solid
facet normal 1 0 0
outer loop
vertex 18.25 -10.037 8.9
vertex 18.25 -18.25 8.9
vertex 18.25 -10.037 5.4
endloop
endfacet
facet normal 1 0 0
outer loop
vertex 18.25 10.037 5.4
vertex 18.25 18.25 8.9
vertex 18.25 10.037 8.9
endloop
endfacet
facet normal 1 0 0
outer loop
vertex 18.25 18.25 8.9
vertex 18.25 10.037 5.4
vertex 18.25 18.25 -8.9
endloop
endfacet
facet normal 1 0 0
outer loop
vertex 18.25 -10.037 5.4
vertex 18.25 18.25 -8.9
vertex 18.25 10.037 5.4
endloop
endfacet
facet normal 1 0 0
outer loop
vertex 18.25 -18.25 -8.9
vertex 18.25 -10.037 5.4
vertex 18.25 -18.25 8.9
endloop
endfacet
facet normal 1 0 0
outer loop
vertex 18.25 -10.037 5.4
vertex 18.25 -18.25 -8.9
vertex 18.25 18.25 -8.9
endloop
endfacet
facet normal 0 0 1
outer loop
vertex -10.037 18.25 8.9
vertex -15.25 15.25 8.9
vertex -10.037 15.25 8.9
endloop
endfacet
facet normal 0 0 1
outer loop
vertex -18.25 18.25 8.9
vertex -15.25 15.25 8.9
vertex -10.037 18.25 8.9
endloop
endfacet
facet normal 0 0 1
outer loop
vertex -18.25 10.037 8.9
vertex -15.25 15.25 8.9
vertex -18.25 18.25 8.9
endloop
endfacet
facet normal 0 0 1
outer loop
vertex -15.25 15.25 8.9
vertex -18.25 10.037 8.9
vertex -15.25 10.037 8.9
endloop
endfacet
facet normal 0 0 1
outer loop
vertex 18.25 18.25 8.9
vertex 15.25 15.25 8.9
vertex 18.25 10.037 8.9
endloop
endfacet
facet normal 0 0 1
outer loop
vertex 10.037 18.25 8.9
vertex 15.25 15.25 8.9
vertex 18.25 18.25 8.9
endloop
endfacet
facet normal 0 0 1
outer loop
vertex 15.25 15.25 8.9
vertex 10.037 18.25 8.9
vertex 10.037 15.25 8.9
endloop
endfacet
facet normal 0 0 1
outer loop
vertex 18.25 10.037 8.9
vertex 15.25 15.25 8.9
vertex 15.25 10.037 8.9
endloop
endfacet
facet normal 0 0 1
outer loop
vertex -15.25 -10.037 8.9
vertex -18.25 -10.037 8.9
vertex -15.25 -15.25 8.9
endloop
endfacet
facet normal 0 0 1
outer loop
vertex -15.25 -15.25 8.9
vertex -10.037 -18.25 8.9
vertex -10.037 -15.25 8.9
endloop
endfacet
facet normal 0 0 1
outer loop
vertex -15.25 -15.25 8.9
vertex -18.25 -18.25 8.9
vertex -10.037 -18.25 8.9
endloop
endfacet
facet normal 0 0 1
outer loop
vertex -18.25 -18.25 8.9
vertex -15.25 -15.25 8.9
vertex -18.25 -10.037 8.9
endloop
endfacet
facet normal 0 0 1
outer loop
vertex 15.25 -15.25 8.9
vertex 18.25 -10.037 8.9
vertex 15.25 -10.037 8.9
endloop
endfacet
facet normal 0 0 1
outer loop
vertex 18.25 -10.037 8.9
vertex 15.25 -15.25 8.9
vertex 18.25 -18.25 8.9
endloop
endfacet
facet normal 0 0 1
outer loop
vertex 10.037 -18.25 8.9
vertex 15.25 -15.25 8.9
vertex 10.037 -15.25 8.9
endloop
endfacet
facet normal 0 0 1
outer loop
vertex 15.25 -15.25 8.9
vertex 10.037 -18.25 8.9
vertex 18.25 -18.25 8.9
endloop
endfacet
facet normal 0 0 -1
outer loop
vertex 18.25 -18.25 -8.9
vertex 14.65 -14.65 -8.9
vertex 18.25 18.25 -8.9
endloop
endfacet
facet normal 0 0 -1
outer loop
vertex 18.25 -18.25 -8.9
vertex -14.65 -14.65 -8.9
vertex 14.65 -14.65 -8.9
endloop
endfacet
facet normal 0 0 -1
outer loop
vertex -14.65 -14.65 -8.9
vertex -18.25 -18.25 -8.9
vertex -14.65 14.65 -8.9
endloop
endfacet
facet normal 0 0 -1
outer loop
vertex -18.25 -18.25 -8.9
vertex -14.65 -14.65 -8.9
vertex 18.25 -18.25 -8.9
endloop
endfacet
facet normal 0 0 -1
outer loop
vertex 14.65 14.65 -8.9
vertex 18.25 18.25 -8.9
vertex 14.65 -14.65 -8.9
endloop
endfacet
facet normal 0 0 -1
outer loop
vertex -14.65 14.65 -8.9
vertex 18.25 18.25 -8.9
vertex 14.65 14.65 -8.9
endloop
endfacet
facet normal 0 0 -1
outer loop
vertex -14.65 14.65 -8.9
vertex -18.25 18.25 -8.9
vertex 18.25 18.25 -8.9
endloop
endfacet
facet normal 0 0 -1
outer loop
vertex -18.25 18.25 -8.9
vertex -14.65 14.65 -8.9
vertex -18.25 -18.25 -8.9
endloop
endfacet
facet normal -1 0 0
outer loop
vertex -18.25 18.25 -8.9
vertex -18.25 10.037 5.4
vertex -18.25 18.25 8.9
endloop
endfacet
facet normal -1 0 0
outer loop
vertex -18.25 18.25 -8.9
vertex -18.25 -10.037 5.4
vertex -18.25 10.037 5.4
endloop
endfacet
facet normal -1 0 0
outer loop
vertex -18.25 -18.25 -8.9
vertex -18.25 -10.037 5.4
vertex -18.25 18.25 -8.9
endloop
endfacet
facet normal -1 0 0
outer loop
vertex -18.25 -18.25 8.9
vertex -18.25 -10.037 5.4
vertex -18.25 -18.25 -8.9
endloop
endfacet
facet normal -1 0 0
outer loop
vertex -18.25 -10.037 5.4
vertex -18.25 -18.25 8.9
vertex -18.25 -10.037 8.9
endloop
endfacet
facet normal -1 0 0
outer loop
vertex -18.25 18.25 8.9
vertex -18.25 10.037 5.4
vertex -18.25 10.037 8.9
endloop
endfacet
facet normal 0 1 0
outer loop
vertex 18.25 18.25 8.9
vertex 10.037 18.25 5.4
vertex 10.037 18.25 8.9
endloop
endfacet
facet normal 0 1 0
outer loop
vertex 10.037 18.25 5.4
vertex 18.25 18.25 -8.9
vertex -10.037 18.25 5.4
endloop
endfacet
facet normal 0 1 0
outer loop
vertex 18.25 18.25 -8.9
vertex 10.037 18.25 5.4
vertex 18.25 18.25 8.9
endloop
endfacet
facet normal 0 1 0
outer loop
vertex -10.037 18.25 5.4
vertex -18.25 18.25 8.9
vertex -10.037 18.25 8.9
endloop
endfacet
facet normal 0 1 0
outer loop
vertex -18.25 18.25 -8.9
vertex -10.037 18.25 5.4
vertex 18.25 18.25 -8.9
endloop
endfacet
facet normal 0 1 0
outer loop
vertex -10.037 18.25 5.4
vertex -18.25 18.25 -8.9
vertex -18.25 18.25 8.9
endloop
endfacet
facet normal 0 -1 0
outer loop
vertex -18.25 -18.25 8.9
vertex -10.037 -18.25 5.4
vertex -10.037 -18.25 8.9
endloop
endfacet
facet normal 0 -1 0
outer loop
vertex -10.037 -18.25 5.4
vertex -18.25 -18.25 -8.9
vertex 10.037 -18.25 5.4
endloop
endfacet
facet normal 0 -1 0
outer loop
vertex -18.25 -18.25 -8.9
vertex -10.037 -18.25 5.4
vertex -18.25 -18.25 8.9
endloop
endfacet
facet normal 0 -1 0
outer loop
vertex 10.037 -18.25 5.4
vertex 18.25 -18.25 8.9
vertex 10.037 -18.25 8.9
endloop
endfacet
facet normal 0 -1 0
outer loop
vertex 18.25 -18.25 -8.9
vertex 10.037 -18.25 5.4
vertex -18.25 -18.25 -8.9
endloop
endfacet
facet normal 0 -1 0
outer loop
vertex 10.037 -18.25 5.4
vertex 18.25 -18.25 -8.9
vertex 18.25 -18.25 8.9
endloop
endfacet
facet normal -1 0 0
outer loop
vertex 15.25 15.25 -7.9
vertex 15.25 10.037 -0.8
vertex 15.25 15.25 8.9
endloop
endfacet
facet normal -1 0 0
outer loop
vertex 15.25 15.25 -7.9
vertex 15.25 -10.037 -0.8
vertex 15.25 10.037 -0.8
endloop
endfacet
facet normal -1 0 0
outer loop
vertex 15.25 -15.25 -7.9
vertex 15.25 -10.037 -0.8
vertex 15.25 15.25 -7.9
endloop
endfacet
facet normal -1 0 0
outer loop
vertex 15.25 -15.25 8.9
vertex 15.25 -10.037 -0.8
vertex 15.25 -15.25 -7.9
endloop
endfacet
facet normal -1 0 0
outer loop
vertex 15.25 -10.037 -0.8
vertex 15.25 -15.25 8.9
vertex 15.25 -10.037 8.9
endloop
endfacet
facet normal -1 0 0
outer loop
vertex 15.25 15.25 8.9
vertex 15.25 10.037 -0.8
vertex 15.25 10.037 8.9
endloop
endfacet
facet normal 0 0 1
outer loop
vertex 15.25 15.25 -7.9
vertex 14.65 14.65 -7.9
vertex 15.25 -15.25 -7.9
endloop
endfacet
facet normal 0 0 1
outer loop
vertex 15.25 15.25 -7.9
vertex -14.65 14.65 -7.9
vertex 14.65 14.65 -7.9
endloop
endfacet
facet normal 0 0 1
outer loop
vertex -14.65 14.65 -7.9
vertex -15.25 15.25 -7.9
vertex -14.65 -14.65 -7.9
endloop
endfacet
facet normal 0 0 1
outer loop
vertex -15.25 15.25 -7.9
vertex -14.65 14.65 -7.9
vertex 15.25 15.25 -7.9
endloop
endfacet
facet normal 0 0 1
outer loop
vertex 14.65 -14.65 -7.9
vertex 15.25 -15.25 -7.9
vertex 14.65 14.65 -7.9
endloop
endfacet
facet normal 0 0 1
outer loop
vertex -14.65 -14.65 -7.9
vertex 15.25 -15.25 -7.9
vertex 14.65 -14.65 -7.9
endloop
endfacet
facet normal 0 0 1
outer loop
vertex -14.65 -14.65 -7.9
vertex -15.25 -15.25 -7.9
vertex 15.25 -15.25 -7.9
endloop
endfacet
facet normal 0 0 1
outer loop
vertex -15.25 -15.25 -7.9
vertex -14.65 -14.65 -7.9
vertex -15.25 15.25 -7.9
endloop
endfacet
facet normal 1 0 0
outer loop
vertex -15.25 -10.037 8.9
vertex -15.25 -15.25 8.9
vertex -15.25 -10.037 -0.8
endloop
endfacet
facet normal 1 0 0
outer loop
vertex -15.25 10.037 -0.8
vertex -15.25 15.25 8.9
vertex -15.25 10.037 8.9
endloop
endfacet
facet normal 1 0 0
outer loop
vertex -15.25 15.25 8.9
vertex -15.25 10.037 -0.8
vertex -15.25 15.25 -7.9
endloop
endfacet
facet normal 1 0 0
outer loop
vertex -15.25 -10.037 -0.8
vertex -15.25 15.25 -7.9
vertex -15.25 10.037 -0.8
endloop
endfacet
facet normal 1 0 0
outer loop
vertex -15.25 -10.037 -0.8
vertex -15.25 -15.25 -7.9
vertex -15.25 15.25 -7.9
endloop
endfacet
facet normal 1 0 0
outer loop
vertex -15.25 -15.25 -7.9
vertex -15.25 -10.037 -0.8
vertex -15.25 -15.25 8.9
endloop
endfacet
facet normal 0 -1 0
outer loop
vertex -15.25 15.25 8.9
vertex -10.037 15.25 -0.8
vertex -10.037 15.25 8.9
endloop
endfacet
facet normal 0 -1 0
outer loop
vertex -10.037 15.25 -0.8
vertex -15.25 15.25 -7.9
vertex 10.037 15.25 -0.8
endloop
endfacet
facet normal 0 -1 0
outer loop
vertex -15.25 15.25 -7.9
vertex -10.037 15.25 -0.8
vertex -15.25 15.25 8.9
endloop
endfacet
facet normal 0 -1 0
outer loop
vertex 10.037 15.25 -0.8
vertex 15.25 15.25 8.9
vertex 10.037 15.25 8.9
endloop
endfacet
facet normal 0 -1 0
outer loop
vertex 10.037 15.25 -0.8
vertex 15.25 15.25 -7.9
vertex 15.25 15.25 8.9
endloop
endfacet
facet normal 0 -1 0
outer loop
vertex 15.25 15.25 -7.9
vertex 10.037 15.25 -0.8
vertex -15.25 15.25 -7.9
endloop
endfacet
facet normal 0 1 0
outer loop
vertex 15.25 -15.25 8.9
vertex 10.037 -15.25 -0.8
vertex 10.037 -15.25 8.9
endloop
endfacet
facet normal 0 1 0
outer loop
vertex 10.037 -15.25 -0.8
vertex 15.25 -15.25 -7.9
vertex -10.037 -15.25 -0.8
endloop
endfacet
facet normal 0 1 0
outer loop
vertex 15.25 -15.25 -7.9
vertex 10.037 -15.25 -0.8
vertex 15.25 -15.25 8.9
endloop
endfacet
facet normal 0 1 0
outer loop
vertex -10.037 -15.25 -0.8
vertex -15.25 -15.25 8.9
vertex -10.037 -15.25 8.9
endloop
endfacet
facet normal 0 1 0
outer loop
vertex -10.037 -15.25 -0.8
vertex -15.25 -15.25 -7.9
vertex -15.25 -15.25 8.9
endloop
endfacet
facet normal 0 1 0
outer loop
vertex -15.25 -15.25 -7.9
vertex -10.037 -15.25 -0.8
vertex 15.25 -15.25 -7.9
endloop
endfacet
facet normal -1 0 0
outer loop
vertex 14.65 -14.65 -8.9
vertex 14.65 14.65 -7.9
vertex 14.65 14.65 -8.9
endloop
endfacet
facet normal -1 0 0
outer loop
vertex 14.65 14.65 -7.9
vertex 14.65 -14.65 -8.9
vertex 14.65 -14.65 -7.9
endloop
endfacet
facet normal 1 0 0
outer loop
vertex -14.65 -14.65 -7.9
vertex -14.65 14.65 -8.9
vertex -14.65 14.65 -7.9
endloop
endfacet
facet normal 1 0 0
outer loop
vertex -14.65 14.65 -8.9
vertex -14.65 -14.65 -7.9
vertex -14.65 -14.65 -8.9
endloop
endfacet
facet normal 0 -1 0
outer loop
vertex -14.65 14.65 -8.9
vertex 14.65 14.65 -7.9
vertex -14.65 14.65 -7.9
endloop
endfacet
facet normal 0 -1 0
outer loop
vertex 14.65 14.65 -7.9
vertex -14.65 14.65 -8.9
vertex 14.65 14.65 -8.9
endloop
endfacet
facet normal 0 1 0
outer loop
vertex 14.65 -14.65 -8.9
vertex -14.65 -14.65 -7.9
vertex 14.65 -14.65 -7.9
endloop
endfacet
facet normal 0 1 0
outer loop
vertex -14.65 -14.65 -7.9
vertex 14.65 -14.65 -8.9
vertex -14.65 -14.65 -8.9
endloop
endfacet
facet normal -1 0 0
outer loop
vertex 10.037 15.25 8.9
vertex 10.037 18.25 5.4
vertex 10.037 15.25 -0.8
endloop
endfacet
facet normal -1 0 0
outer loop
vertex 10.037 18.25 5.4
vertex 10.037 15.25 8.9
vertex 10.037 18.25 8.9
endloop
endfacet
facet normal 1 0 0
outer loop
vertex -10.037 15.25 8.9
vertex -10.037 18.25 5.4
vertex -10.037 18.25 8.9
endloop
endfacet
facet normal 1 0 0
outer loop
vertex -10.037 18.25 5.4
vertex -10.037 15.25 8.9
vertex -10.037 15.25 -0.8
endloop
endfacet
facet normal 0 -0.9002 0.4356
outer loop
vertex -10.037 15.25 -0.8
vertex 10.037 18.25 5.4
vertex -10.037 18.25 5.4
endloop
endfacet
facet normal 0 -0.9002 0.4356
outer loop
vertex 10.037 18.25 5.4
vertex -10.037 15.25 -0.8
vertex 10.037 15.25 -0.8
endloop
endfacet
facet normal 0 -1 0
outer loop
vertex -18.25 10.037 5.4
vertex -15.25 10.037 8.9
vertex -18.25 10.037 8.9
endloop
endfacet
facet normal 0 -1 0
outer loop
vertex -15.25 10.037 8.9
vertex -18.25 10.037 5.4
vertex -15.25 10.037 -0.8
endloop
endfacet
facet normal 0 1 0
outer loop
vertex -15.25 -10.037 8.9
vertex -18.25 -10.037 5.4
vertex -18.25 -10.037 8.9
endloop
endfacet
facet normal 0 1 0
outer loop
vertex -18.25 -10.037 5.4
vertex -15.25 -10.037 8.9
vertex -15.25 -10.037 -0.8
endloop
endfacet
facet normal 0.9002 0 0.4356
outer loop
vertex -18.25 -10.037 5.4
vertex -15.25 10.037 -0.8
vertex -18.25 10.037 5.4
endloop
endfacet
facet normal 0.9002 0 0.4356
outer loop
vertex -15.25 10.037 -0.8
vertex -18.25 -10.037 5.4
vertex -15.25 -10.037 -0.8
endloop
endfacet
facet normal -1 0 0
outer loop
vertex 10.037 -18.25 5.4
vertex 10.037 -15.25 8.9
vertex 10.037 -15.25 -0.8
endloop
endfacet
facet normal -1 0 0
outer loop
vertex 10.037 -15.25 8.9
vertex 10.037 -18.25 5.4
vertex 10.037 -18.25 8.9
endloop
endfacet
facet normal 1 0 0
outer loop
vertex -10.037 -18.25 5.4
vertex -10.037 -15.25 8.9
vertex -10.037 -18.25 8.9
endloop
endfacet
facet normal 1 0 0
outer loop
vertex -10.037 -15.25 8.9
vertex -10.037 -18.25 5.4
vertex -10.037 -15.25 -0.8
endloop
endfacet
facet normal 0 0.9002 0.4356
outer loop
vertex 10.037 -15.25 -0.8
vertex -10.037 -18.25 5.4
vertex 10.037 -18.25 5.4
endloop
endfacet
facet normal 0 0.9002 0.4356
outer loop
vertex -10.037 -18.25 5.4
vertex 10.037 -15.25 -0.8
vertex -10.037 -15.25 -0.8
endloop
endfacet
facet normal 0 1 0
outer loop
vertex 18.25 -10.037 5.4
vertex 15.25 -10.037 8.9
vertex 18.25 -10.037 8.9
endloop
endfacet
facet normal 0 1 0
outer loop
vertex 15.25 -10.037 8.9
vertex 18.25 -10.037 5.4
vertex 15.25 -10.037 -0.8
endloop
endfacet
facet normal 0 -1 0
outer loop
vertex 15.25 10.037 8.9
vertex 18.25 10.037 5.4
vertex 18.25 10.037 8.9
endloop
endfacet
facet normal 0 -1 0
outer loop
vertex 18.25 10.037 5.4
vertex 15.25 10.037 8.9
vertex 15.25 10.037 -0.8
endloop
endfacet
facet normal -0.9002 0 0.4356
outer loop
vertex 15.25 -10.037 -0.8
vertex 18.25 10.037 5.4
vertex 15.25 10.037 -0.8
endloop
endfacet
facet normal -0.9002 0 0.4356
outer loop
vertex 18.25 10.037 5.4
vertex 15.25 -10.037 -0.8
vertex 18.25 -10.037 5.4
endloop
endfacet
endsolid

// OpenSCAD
// file: meta.scad
deviceFudge=0.5;//mm, fudge factor to account for printing inaccuracy, shrinkage
PCBThickness=1.6; //mm
pinRecepticalTop=5.5;//mm above pcb that the pin receptical extends
pinsHeight=pinRecepticalTop+4.2+2;//mm above pcb, fully extended
maxSubstrateThickness=3;//mm
wallT=3;//mm, wall thickness
PCBShelfW=0.6;//mm, the pcb sits on this
belowPBC=1;//mm extension below PCB
crownFraction=0.55;//fraction of each side length to subtract to make extension corners

solidHeight=pinsHeight;//mm above pcb for solid wall
crownHeight=maxSubstrateThickness+0.5;//mm, corners extension above pin ends
totalHeight=belowPBC+PCBThickness+solidHeight+crownHeight;

module base ( xyDev ) {
    vDeviceDim=xyDev+deviceFudge;
    xyLen=vDeviceDim+wallT*2;
    difference(){
        cube([xyLen,xyLen,totalHeight],center = true);
        translate([0,0,belowPBC]) cube([vDeviceDim,vDeviceDim,totalHeight],center = true);
        cube([vDeviceDim-2*PCBShelfW,vDeviceDim-2*PCBShelfW,totalHeight+1],center = true);
        
        translate([0,xyLen/2,totalHeight/2+(crownHeight+1)/2-crownHeight]) cube([xyLen*crownFraction,xyLen,crownHeight+1],center = true);
        rotate([0,0,180]) translate([-xyLen*crownFraction/2,-xyLen/2,totalHeight/2-crownHeight]) rotate([0,90,0])  linear_extrude(height=xyLen*crownFraction) polygon([[0,0],[0,wallT],[(pinsHeight-pinRecepticalTop),wallT]]);
        
        rotate([0,0,90]) translate([0,xyLen/2,totalHeight/2+(crownHeight+1)/2-crownHeight]) cube([xyLen*crownFraction,xyLen,crownHeight+1],center = true);
        rotate([0,0,270]) translate([-xyLen*crownFraction/2,-xyLen/2,totalHeight/2-crownHeight]) rotate([0,90,0])  linear_extrude(height=xyLen*crownFraction) polygon([[0,0],[0,wallT],[(pinsHeight-pinRecepticalTop),wallT]]);
        
        rotate([0,0,180]) translate([0,xyLen/2,totalHeight/2+(crownHeight+1)/2-crownHeight]) cube([xyLen*crownFraction,xyLen,crownHeight+1],center = true);
        translate([-xyLen*crownFraction/2,-xyLen/2,totalHeight/2-crownHeight]) rotate([0,90,0])  linear_extrude(height=xyLen*crownFraction) polygon([[0,0],[0,wallT],[(pinsHeight-pinRecepticalTop),wallT]]);
        
        rotate([0,0,270]) translate([0,xyLen/2,totalHeight/2+(crownHeight+1)/2-crownHeight]) cube([xyLen*crownFraction,xyLen,crownHeight+1],center = true);
        rotate([0,0,90]) translate([-xyLen*crownFraction/2,-xyLen/2,totalHeight/2-crownHeight]) rotate([0,90,0])  linear_extrude(height=xyLen*crownFraction) polygon([[0,0],[0,wallT],[(pinsHeight-pinRecepticalTop),wallT]]);
    }
}
// main file
include <meta.scad>;

//deviceDim=28; //mm, x,y dimension of substrate, pcb
deviceDim=30; //mm, x,y dimension of substrate, pcb
//deviceDim=25; //mm, x,y dimension of substrate, pcb, DBG

base(deviceDim);
